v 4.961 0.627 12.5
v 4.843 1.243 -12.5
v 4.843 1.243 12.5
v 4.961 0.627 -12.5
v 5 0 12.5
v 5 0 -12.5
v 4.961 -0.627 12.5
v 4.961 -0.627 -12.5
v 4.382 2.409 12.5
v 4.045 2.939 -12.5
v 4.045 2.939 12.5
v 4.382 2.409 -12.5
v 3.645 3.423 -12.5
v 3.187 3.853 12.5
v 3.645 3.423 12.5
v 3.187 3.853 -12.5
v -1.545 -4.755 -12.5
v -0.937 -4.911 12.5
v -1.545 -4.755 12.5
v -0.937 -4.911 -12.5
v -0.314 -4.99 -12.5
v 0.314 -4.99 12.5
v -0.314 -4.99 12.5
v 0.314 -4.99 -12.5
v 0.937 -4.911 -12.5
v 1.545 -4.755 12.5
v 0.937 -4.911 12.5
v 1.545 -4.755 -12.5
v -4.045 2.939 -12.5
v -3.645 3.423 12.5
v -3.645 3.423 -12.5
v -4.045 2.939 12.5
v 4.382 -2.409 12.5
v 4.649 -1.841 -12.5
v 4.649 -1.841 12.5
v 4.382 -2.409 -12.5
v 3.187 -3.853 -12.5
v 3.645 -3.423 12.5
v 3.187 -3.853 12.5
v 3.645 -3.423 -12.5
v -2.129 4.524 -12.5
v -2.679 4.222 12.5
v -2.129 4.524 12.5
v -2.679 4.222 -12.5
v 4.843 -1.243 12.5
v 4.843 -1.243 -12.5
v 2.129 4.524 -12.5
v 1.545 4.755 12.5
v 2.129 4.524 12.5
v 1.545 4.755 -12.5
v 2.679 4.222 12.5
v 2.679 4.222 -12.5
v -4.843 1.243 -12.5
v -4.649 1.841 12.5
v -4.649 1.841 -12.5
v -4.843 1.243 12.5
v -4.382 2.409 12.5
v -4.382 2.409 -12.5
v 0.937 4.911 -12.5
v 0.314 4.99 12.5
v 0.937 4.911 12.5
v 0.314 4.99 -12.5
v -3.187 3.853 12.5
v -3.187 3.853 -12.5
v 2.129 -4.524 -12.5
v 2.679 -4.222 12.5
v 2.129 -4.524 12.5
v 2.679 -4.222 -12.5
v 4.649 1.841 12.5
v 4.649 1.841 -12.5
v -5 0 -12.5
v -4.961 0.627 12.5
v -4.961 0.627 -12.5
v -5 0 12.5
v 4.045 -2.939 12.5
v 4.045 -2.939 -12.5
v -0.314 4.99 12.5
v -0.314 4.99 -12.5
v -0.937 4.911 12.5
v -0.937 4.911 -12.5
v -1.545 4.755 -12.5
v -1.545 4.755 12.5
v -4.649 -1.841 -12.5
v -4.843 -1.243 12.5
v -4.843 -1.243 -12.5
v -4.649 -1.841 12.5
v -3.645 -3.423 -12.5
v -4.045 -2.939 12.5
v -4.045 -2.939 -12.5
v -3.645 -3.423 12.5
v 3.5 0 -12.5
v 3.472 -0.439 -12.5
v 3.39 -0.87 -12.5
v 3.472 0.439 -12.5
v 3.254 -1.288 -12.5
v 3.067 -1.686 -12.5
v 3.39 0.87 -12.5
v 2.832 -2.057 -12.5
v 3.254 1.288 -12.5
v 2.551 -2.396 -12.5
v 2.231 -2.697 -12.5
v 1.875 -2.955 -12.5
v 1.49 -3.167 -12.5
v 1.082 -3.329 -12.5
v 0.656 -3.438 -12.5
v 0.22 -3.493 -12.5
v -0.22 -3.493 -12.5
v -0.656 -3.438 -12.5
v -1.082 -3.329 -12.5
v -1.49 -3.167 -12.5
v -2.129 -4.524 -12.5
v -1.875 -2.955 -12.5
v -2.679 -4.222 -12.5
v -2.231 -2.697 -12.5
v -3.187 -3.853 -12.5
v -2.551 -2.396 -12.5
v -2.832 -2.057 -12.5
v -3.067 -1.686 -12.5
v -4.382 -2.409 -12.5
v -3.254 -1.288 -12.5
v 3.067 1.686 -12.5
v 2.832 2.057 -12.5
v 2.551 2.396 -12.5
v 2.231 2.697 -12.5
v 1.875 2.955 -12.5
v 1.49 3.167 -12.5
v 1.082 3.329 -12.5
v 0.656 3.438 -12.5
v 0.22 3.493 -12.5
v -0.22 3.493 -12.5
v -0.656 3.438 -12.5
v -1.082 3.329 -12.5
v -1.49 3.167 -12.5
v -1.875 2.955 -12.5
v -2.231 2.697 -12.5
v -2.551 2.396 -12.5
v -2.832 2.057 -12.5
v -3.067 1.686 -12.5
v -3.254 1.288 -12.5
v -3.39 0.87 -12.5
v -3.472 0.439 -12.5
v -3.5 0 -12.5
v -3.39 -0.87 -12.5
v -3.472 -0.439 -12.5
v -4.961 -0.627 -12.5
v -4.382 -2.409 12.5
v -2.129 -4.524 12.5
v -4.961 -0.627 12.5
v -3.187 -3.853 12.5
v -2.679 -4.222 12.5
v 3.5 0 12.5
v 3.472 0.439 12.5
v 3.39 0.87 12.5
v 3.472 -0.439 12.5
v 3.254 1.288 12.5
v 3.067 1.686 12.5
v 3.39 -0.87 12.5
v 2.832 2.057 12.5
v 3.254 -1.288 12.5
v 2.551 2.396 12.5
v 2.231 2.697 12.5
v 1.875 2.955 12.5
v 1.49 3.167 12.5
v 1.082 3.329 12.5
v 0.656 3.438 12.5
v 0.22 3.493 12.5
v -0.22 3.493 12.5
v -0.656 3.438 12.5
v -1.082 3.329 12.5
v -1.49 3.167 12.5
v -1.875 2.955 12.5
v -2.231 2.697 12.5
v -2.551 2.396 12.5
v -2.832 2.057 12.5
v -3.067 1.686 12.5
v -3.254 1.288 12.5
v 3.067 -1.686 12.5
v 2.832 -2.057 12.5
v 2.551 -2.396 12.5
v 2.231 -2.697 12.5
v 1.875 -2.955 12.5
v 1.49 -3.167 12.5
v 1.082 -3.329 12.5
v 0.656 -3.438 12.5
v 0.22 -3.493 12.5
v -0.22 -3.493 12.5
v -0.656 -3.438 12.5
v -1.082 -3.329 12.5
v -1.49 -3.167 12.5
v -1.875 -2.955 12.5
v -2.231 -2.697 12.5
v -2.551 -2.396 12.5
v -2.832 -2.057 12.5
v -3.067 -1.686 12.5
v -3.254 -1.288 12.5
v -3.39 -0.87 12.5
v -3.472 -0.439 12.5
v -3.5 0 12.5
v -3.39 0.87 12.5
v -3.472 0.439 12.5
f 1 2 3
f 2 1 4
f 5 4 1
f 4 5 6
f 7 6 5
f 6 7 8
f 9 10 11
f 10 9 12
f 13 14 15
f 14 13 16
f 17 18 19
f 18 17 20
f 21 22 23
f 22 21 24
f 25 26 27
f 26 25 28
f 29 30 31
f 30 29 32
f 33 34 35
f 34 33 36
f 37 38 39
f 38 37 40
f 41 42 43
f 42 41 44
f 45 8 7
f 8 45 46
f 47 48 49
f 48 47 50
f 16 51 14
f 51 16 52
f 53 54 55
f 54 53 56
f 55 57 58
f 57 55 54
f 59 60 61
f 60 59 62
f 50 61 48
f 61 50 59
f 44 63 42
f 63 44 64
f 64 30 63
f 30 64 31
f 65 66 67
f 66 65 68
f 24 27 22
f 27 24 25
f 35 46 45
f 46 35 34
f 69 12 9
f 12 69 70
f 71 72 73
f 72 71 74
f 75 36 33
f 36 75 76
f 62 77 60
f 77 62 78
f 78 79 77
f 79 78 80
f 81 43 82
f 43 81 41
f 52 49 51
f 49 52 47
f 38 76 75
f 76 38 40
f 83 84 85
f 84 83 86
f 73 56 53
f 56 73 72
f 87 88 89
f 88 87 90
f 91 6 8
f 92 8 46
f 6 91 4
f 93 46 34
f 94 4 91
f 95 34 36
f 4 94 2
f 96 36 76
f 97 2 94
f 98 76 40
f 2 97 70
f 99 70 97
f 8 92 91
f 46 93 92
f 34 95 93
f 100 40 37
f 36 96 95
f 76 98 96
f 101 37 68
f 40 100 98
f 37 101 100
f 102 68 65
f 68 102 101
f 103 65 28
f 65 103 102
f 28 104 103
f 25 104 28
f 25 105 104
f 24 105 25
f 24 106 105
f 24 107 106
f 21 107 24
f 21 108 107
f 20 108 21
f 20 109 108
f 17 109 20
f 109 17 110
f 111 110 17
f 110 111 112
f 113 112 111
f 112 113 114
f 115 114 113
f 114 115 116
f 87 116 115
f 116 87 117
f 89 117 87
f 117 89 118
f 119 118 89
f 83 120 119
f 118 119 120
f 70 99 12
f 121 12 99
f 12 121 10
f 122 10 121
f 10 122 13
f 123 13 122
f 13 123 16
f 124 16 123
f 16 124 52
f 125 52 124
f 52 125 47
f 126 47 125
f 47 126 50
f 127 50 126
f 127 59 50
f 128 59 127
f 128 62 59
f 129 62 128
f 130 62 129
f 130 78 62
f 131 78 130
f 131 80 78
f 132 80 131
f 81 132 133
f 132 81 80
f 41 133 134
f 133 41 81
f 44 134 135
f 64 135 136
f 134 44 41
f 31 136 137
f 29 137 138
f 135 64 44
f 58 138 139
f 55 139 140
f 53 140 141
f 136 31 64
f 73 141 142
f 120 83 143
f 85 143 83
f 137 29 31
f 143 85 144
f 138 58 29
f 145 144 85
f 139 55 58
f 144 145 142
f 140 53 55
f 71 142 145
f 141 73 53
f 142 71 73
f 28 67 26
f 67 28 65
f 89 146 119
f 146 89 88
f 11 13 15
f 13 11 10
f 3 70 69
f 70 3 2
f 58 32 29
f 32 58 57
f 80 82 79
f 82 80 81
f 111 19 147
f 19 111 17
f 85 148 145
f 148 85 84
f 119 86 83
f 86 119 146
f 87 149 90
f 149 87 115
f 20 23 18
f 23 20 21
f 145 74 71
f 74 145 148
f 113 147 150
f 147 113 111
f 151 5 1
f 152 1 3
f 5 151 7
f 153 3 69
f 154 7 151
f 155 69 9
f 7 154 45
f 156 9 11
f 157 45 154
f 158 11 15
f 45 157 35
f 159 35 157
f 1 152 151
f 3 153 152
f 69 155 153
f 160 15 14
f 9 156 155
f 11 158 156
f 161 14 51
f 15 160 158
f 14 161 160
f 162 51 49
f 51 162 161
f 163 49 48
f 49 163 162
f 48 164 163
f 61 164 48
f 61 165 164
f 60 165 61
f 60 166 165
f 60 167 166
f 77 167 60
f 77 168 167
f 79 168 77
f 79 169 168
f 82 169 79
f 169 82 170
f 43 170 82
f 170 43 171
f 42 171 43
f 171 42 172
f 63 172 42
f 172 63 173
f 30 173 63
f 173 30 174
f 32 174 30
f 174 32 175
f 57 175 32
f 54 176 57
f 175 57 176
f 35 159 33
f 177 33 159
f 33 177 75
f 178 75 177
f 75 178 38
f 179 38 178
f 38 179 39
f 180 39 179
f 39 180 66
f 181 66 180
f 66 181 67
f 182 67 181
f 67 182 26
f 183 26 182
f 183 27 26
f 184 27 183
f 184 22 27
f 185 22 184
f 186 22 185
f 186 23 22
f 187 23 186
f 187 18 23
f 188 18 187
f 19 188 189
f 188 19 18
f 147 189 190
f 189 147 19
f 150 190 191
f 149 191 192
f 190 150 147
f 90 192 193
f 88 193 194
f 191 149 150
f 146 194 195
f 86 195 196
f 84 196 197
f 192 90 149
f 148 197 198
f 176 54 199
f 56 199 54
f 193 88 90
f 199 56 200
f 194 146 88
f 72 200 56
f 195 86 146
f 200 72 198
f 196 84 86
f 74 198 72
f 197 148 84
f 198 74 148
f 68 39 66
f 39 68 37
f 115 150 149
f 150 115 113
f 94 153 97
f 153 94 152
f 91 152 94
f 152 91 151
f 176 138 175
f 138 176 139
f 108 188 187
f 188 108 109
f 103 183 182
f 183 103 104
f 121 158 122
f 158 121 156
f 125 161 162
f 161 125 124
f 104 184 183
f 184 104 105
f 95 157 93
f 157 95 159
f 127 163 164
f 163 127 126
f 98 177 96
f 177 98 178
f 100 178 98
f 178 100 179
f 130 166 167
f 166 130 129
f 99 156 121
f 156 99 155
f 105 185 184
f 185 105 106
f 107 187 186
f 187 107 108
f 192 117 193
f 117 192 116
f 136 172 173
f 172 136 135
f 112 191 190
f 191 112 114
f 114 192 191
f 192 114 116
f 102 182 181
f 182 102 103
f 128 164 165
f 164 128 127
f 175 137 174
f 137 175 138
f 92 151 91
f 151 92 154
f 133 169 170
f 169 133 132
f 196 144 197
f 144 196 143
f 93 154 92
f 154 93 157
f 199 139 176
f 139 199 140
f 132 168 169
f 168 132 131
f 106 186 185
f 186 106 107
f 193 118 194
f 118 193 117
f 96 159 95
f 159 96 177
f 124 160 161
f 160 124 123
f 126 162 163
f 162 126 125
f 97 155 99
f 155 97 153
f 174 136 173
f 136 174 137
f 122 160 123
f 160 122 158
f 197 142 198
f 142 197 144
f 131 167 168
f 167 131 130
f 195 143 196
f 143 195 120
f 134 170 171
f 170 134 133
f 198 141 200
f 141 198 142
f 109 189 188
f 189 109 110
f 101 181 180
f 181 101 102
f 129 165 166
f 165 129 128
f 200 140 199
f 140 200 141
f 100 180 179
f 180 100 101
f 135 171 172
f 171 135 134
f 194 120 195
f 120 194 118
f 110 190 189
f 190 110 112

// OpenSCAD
$fn = 50;


difference() {
	union() {
		translate(v = [0, 0, -12.5000000000]) {
			cylinder(h = 25, r = 5.0000000000);
		}
	}
	union() {
		translate(v = [0, 0, -100.0000000000]) {
			cylinder(h = 200, r = 3.5000000000);
		}
	}
}
